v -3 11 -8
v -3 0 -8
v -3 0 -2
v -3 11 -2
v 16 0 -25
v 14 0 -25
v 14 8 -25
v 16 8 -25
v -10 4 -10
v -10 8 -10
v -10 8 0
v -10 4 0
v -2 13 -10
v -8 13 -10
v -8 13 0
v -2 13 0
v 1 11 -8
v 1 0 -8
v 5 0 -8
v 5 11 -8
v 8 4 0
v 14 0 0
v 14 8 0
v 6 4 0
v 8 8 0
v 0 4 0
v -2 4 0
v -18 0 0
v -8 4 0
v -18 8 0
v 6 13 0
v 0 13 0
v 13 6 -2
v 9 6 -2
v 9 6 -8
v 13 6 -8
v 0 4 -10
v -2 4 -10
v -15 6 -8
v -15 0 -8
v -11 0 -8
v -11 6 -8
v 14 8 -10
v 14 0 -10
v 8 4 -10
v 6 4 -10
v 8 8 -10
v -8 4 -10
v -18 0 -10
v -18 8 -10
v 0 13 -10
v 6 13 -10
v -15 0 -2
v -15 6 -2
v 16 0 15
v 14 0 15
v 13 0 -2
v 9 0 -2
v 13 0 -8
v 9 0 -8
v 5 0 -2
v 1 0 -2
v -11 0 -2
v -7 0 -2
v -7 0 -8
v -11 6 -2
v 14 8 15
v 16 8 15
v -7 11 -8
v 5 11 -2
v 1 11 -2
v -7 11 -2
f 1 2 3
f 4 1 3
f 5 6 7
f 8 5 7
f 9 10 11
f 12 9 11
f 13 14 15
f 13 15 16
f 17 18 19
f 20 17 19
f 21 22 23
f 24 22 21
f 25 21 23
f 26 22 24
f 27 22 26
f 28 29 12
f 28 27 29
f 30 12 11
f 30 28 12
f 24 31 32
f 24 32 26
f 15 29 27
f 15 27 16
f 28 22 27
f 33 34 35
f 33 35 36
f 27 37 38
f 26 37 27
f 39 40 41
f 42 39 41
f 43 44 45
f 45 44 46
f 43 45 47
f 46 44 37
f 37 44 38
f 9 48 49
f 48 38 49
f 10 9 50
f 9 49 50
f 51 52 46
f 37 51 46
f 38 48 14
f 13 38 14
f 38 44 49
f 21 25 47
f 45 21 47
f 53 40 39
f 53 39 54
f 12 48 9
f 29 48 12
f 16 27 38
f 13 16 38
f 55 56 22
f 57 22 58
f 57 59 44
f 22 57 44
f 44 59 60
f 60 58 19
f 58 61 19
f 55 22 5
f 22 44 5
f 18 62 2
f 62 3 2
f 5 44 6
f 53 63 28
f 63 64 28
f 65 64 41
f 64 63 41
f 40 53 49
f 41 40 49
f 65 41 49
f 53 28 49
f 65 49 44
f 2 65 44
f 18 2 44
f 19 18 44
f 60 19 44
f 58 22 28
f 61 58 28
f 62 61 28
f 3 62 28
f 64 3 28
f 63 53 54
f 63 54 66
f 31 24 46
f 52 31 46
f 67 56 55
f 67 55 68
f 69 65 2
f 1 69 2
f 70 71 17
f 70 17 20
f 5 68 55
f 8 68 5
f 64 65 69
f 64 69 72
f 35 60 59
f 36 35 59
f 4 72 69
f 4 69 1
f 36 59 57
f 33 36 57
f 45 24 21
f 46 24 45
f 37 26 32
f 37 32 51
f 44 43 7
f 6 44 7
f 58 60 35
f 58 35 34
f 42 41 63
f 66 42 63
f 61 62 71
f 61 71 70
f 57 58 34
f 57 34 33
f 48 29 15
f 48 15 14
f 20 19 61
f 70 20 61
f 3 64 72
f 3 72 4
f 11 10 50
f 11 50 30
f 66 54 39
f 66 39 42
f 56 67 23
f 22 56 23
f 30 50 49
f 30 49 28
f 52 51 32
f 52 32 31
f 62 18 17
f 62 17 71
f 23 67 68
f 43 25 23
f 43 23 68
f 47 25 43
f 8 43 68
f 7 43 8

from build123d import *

# Parameters (mm, degrees)
SKETCH1_W           = 6
SKETCH1_H           = 10
BOSS_EXTRUDE1_DEPTH = 13
SKETCH2_W           = 4
SKETCH2_H           = 6
CUT_EXTRUDE1_DEPTH  = 11
SKETCH3_W           = 10
SKETCH3_H           = 4
BOSS_EXTRUDE2_DEPTH = 2
LPATTERN1_COUNT     = 2
LPATTERN1_PITCH     = 8
SKETCH18_W          = 10
SKETCH18_H          = 8
BOSS_EXTRUDE3_DEPTH = 8
SKETCH20_W          = 10
SKETCH20_H          = 4
BOSS_EXTRUDE4_DEPTH = 2
SKETCH21_W          = 10
SKETCH21_H          = 8
BOSS_EXTRUDE5_DEPTH = 6
SKETCH22_W          = 40
SKETCH22_H          = 8
BOSS_EXTRUDE6_DEPTH = 2
SKETCH23_W          = 4
SKETCH23_H          = 6
CUT_EXTRUDE2_DEPTH  = 6


with BuildPart() as part:
    # Sketch1 → Boss-Extrude1 (new body)
    with BuildSketch(Plane(origin=(0, 0, 0), x_dir=(1, 0, 0), z_dir=(0, 1, 0))):
        with Locations((3, 5)):
            Rectangle(SKETCH1_W, SKETCH1_H)
    extrude(amount=BOSS_EXTRUDE1_DEPTH)

    # Sketch2 → Cut-Extrude1 (cut)
    with BuildSketch(Plane.XZ):
        with Locations((3, -5)):
            Rectangle(SKETCH2_W, SKETCH2_H)
    extrude(amount=-CUT_EXTRUDE1_DEPTH, mode=Mode.SUBTRACT)

    # Sketch3 → Boss-Extrude2 (add)
    with BuildSketch(Plane.ZY):
        with Locations((-5, 2)):
            Rectangle(SKETCH3_W, SKETCH3_H)
    extrude(amount=BOSS_EXTRUDE2_DEPTH)


with BuildPart() as lpattern1_1:
    # LPattern1: pattern copy
    add(part.part.moved(Location(Vector(-1, 0, 0) * (1 * LPATTERN1_PITCH))))

    # Sketch18 → Boss-Extrude3 (add)
    with BuildSketch(Plane.ZY.offset(10)):
        with Locations((-5, 4)):
            Rectangle(SKETCH18_W, SKETCH18_H)
    extrude(amount=BOSS_EXTRUDE3_DEPTH)


with BuildPart() as part_1:
    add(part.part)

    # Sketch20 → Boss-Extrude4 (add)
    with BuildSketch(Plane(origin=(6, 0, 0), x_dir=(0, 0, -1), z_dir=(1, 0, 0))):
        with Locations((5, 2)):
            Rectangle(SKETCH20_W, SKETCH20_H)
    extrude(amount=BOSS_EXTRUDE4_DEPTH)

    # Sketch21 → Boss-Extrude5 (add)
    with BuildSketch(Plane(origin=(8, 0, 0), x_dir=(0, 0, -1), z_dir=(1, 0, 0))):
        with Locations((5, 4)):
            Rectangle(SKETCH21_W, SKETCH21_H)
    extrude(amount=BOSS_EXTRUDE5_DEPTH)

    # Sketch22 → Boss-Extrude6 (add)
    with BuildSketch(Plane(origin=(14, 0, 0), x_dir=(0, 0, -1), z_dir=(1, 0, 0))):
        with Locations((5, 4)):
            Rectangle(SKETCH22_W, SKETCH22_H)
    extrude(amount=BOSS_EXTRUDE6_DEPTH)


with BuildPart() as cut_extrude2_tool:
    # Sketch23 → Cut-Extrude2 (new body)
    with BuildSketch(Plane.XZ):
        with Locations((11, -5)):
            Rectangle(SKETCH23_W, SKETCH23_H)
        with Locations((-13, -5)):
            Rectangle(SKETCH23_W, SKETCH23_H)
    extrude(amount=-CUT_EXTRUDE2_DEPTH)


with BuildPart() as part_2:
    add(part_1.part)

    # Cut-Extrude2: cut by cut_extrude2_tool
    add(cut_extrude2_tool.part, mode=Mode.SUBTRACT)


with BuildPart() as lpattern1_1_1:
    add(lpattern1_1.part)

    # Cut-Extrude2: cut by cut_extrude2_tool
    add(cut_extrude2_tool.part, mode=Mode.SUBTRACT)

    # Combine1: union part
    add(part_2.part)


solid = lpattern1_1_1.part
